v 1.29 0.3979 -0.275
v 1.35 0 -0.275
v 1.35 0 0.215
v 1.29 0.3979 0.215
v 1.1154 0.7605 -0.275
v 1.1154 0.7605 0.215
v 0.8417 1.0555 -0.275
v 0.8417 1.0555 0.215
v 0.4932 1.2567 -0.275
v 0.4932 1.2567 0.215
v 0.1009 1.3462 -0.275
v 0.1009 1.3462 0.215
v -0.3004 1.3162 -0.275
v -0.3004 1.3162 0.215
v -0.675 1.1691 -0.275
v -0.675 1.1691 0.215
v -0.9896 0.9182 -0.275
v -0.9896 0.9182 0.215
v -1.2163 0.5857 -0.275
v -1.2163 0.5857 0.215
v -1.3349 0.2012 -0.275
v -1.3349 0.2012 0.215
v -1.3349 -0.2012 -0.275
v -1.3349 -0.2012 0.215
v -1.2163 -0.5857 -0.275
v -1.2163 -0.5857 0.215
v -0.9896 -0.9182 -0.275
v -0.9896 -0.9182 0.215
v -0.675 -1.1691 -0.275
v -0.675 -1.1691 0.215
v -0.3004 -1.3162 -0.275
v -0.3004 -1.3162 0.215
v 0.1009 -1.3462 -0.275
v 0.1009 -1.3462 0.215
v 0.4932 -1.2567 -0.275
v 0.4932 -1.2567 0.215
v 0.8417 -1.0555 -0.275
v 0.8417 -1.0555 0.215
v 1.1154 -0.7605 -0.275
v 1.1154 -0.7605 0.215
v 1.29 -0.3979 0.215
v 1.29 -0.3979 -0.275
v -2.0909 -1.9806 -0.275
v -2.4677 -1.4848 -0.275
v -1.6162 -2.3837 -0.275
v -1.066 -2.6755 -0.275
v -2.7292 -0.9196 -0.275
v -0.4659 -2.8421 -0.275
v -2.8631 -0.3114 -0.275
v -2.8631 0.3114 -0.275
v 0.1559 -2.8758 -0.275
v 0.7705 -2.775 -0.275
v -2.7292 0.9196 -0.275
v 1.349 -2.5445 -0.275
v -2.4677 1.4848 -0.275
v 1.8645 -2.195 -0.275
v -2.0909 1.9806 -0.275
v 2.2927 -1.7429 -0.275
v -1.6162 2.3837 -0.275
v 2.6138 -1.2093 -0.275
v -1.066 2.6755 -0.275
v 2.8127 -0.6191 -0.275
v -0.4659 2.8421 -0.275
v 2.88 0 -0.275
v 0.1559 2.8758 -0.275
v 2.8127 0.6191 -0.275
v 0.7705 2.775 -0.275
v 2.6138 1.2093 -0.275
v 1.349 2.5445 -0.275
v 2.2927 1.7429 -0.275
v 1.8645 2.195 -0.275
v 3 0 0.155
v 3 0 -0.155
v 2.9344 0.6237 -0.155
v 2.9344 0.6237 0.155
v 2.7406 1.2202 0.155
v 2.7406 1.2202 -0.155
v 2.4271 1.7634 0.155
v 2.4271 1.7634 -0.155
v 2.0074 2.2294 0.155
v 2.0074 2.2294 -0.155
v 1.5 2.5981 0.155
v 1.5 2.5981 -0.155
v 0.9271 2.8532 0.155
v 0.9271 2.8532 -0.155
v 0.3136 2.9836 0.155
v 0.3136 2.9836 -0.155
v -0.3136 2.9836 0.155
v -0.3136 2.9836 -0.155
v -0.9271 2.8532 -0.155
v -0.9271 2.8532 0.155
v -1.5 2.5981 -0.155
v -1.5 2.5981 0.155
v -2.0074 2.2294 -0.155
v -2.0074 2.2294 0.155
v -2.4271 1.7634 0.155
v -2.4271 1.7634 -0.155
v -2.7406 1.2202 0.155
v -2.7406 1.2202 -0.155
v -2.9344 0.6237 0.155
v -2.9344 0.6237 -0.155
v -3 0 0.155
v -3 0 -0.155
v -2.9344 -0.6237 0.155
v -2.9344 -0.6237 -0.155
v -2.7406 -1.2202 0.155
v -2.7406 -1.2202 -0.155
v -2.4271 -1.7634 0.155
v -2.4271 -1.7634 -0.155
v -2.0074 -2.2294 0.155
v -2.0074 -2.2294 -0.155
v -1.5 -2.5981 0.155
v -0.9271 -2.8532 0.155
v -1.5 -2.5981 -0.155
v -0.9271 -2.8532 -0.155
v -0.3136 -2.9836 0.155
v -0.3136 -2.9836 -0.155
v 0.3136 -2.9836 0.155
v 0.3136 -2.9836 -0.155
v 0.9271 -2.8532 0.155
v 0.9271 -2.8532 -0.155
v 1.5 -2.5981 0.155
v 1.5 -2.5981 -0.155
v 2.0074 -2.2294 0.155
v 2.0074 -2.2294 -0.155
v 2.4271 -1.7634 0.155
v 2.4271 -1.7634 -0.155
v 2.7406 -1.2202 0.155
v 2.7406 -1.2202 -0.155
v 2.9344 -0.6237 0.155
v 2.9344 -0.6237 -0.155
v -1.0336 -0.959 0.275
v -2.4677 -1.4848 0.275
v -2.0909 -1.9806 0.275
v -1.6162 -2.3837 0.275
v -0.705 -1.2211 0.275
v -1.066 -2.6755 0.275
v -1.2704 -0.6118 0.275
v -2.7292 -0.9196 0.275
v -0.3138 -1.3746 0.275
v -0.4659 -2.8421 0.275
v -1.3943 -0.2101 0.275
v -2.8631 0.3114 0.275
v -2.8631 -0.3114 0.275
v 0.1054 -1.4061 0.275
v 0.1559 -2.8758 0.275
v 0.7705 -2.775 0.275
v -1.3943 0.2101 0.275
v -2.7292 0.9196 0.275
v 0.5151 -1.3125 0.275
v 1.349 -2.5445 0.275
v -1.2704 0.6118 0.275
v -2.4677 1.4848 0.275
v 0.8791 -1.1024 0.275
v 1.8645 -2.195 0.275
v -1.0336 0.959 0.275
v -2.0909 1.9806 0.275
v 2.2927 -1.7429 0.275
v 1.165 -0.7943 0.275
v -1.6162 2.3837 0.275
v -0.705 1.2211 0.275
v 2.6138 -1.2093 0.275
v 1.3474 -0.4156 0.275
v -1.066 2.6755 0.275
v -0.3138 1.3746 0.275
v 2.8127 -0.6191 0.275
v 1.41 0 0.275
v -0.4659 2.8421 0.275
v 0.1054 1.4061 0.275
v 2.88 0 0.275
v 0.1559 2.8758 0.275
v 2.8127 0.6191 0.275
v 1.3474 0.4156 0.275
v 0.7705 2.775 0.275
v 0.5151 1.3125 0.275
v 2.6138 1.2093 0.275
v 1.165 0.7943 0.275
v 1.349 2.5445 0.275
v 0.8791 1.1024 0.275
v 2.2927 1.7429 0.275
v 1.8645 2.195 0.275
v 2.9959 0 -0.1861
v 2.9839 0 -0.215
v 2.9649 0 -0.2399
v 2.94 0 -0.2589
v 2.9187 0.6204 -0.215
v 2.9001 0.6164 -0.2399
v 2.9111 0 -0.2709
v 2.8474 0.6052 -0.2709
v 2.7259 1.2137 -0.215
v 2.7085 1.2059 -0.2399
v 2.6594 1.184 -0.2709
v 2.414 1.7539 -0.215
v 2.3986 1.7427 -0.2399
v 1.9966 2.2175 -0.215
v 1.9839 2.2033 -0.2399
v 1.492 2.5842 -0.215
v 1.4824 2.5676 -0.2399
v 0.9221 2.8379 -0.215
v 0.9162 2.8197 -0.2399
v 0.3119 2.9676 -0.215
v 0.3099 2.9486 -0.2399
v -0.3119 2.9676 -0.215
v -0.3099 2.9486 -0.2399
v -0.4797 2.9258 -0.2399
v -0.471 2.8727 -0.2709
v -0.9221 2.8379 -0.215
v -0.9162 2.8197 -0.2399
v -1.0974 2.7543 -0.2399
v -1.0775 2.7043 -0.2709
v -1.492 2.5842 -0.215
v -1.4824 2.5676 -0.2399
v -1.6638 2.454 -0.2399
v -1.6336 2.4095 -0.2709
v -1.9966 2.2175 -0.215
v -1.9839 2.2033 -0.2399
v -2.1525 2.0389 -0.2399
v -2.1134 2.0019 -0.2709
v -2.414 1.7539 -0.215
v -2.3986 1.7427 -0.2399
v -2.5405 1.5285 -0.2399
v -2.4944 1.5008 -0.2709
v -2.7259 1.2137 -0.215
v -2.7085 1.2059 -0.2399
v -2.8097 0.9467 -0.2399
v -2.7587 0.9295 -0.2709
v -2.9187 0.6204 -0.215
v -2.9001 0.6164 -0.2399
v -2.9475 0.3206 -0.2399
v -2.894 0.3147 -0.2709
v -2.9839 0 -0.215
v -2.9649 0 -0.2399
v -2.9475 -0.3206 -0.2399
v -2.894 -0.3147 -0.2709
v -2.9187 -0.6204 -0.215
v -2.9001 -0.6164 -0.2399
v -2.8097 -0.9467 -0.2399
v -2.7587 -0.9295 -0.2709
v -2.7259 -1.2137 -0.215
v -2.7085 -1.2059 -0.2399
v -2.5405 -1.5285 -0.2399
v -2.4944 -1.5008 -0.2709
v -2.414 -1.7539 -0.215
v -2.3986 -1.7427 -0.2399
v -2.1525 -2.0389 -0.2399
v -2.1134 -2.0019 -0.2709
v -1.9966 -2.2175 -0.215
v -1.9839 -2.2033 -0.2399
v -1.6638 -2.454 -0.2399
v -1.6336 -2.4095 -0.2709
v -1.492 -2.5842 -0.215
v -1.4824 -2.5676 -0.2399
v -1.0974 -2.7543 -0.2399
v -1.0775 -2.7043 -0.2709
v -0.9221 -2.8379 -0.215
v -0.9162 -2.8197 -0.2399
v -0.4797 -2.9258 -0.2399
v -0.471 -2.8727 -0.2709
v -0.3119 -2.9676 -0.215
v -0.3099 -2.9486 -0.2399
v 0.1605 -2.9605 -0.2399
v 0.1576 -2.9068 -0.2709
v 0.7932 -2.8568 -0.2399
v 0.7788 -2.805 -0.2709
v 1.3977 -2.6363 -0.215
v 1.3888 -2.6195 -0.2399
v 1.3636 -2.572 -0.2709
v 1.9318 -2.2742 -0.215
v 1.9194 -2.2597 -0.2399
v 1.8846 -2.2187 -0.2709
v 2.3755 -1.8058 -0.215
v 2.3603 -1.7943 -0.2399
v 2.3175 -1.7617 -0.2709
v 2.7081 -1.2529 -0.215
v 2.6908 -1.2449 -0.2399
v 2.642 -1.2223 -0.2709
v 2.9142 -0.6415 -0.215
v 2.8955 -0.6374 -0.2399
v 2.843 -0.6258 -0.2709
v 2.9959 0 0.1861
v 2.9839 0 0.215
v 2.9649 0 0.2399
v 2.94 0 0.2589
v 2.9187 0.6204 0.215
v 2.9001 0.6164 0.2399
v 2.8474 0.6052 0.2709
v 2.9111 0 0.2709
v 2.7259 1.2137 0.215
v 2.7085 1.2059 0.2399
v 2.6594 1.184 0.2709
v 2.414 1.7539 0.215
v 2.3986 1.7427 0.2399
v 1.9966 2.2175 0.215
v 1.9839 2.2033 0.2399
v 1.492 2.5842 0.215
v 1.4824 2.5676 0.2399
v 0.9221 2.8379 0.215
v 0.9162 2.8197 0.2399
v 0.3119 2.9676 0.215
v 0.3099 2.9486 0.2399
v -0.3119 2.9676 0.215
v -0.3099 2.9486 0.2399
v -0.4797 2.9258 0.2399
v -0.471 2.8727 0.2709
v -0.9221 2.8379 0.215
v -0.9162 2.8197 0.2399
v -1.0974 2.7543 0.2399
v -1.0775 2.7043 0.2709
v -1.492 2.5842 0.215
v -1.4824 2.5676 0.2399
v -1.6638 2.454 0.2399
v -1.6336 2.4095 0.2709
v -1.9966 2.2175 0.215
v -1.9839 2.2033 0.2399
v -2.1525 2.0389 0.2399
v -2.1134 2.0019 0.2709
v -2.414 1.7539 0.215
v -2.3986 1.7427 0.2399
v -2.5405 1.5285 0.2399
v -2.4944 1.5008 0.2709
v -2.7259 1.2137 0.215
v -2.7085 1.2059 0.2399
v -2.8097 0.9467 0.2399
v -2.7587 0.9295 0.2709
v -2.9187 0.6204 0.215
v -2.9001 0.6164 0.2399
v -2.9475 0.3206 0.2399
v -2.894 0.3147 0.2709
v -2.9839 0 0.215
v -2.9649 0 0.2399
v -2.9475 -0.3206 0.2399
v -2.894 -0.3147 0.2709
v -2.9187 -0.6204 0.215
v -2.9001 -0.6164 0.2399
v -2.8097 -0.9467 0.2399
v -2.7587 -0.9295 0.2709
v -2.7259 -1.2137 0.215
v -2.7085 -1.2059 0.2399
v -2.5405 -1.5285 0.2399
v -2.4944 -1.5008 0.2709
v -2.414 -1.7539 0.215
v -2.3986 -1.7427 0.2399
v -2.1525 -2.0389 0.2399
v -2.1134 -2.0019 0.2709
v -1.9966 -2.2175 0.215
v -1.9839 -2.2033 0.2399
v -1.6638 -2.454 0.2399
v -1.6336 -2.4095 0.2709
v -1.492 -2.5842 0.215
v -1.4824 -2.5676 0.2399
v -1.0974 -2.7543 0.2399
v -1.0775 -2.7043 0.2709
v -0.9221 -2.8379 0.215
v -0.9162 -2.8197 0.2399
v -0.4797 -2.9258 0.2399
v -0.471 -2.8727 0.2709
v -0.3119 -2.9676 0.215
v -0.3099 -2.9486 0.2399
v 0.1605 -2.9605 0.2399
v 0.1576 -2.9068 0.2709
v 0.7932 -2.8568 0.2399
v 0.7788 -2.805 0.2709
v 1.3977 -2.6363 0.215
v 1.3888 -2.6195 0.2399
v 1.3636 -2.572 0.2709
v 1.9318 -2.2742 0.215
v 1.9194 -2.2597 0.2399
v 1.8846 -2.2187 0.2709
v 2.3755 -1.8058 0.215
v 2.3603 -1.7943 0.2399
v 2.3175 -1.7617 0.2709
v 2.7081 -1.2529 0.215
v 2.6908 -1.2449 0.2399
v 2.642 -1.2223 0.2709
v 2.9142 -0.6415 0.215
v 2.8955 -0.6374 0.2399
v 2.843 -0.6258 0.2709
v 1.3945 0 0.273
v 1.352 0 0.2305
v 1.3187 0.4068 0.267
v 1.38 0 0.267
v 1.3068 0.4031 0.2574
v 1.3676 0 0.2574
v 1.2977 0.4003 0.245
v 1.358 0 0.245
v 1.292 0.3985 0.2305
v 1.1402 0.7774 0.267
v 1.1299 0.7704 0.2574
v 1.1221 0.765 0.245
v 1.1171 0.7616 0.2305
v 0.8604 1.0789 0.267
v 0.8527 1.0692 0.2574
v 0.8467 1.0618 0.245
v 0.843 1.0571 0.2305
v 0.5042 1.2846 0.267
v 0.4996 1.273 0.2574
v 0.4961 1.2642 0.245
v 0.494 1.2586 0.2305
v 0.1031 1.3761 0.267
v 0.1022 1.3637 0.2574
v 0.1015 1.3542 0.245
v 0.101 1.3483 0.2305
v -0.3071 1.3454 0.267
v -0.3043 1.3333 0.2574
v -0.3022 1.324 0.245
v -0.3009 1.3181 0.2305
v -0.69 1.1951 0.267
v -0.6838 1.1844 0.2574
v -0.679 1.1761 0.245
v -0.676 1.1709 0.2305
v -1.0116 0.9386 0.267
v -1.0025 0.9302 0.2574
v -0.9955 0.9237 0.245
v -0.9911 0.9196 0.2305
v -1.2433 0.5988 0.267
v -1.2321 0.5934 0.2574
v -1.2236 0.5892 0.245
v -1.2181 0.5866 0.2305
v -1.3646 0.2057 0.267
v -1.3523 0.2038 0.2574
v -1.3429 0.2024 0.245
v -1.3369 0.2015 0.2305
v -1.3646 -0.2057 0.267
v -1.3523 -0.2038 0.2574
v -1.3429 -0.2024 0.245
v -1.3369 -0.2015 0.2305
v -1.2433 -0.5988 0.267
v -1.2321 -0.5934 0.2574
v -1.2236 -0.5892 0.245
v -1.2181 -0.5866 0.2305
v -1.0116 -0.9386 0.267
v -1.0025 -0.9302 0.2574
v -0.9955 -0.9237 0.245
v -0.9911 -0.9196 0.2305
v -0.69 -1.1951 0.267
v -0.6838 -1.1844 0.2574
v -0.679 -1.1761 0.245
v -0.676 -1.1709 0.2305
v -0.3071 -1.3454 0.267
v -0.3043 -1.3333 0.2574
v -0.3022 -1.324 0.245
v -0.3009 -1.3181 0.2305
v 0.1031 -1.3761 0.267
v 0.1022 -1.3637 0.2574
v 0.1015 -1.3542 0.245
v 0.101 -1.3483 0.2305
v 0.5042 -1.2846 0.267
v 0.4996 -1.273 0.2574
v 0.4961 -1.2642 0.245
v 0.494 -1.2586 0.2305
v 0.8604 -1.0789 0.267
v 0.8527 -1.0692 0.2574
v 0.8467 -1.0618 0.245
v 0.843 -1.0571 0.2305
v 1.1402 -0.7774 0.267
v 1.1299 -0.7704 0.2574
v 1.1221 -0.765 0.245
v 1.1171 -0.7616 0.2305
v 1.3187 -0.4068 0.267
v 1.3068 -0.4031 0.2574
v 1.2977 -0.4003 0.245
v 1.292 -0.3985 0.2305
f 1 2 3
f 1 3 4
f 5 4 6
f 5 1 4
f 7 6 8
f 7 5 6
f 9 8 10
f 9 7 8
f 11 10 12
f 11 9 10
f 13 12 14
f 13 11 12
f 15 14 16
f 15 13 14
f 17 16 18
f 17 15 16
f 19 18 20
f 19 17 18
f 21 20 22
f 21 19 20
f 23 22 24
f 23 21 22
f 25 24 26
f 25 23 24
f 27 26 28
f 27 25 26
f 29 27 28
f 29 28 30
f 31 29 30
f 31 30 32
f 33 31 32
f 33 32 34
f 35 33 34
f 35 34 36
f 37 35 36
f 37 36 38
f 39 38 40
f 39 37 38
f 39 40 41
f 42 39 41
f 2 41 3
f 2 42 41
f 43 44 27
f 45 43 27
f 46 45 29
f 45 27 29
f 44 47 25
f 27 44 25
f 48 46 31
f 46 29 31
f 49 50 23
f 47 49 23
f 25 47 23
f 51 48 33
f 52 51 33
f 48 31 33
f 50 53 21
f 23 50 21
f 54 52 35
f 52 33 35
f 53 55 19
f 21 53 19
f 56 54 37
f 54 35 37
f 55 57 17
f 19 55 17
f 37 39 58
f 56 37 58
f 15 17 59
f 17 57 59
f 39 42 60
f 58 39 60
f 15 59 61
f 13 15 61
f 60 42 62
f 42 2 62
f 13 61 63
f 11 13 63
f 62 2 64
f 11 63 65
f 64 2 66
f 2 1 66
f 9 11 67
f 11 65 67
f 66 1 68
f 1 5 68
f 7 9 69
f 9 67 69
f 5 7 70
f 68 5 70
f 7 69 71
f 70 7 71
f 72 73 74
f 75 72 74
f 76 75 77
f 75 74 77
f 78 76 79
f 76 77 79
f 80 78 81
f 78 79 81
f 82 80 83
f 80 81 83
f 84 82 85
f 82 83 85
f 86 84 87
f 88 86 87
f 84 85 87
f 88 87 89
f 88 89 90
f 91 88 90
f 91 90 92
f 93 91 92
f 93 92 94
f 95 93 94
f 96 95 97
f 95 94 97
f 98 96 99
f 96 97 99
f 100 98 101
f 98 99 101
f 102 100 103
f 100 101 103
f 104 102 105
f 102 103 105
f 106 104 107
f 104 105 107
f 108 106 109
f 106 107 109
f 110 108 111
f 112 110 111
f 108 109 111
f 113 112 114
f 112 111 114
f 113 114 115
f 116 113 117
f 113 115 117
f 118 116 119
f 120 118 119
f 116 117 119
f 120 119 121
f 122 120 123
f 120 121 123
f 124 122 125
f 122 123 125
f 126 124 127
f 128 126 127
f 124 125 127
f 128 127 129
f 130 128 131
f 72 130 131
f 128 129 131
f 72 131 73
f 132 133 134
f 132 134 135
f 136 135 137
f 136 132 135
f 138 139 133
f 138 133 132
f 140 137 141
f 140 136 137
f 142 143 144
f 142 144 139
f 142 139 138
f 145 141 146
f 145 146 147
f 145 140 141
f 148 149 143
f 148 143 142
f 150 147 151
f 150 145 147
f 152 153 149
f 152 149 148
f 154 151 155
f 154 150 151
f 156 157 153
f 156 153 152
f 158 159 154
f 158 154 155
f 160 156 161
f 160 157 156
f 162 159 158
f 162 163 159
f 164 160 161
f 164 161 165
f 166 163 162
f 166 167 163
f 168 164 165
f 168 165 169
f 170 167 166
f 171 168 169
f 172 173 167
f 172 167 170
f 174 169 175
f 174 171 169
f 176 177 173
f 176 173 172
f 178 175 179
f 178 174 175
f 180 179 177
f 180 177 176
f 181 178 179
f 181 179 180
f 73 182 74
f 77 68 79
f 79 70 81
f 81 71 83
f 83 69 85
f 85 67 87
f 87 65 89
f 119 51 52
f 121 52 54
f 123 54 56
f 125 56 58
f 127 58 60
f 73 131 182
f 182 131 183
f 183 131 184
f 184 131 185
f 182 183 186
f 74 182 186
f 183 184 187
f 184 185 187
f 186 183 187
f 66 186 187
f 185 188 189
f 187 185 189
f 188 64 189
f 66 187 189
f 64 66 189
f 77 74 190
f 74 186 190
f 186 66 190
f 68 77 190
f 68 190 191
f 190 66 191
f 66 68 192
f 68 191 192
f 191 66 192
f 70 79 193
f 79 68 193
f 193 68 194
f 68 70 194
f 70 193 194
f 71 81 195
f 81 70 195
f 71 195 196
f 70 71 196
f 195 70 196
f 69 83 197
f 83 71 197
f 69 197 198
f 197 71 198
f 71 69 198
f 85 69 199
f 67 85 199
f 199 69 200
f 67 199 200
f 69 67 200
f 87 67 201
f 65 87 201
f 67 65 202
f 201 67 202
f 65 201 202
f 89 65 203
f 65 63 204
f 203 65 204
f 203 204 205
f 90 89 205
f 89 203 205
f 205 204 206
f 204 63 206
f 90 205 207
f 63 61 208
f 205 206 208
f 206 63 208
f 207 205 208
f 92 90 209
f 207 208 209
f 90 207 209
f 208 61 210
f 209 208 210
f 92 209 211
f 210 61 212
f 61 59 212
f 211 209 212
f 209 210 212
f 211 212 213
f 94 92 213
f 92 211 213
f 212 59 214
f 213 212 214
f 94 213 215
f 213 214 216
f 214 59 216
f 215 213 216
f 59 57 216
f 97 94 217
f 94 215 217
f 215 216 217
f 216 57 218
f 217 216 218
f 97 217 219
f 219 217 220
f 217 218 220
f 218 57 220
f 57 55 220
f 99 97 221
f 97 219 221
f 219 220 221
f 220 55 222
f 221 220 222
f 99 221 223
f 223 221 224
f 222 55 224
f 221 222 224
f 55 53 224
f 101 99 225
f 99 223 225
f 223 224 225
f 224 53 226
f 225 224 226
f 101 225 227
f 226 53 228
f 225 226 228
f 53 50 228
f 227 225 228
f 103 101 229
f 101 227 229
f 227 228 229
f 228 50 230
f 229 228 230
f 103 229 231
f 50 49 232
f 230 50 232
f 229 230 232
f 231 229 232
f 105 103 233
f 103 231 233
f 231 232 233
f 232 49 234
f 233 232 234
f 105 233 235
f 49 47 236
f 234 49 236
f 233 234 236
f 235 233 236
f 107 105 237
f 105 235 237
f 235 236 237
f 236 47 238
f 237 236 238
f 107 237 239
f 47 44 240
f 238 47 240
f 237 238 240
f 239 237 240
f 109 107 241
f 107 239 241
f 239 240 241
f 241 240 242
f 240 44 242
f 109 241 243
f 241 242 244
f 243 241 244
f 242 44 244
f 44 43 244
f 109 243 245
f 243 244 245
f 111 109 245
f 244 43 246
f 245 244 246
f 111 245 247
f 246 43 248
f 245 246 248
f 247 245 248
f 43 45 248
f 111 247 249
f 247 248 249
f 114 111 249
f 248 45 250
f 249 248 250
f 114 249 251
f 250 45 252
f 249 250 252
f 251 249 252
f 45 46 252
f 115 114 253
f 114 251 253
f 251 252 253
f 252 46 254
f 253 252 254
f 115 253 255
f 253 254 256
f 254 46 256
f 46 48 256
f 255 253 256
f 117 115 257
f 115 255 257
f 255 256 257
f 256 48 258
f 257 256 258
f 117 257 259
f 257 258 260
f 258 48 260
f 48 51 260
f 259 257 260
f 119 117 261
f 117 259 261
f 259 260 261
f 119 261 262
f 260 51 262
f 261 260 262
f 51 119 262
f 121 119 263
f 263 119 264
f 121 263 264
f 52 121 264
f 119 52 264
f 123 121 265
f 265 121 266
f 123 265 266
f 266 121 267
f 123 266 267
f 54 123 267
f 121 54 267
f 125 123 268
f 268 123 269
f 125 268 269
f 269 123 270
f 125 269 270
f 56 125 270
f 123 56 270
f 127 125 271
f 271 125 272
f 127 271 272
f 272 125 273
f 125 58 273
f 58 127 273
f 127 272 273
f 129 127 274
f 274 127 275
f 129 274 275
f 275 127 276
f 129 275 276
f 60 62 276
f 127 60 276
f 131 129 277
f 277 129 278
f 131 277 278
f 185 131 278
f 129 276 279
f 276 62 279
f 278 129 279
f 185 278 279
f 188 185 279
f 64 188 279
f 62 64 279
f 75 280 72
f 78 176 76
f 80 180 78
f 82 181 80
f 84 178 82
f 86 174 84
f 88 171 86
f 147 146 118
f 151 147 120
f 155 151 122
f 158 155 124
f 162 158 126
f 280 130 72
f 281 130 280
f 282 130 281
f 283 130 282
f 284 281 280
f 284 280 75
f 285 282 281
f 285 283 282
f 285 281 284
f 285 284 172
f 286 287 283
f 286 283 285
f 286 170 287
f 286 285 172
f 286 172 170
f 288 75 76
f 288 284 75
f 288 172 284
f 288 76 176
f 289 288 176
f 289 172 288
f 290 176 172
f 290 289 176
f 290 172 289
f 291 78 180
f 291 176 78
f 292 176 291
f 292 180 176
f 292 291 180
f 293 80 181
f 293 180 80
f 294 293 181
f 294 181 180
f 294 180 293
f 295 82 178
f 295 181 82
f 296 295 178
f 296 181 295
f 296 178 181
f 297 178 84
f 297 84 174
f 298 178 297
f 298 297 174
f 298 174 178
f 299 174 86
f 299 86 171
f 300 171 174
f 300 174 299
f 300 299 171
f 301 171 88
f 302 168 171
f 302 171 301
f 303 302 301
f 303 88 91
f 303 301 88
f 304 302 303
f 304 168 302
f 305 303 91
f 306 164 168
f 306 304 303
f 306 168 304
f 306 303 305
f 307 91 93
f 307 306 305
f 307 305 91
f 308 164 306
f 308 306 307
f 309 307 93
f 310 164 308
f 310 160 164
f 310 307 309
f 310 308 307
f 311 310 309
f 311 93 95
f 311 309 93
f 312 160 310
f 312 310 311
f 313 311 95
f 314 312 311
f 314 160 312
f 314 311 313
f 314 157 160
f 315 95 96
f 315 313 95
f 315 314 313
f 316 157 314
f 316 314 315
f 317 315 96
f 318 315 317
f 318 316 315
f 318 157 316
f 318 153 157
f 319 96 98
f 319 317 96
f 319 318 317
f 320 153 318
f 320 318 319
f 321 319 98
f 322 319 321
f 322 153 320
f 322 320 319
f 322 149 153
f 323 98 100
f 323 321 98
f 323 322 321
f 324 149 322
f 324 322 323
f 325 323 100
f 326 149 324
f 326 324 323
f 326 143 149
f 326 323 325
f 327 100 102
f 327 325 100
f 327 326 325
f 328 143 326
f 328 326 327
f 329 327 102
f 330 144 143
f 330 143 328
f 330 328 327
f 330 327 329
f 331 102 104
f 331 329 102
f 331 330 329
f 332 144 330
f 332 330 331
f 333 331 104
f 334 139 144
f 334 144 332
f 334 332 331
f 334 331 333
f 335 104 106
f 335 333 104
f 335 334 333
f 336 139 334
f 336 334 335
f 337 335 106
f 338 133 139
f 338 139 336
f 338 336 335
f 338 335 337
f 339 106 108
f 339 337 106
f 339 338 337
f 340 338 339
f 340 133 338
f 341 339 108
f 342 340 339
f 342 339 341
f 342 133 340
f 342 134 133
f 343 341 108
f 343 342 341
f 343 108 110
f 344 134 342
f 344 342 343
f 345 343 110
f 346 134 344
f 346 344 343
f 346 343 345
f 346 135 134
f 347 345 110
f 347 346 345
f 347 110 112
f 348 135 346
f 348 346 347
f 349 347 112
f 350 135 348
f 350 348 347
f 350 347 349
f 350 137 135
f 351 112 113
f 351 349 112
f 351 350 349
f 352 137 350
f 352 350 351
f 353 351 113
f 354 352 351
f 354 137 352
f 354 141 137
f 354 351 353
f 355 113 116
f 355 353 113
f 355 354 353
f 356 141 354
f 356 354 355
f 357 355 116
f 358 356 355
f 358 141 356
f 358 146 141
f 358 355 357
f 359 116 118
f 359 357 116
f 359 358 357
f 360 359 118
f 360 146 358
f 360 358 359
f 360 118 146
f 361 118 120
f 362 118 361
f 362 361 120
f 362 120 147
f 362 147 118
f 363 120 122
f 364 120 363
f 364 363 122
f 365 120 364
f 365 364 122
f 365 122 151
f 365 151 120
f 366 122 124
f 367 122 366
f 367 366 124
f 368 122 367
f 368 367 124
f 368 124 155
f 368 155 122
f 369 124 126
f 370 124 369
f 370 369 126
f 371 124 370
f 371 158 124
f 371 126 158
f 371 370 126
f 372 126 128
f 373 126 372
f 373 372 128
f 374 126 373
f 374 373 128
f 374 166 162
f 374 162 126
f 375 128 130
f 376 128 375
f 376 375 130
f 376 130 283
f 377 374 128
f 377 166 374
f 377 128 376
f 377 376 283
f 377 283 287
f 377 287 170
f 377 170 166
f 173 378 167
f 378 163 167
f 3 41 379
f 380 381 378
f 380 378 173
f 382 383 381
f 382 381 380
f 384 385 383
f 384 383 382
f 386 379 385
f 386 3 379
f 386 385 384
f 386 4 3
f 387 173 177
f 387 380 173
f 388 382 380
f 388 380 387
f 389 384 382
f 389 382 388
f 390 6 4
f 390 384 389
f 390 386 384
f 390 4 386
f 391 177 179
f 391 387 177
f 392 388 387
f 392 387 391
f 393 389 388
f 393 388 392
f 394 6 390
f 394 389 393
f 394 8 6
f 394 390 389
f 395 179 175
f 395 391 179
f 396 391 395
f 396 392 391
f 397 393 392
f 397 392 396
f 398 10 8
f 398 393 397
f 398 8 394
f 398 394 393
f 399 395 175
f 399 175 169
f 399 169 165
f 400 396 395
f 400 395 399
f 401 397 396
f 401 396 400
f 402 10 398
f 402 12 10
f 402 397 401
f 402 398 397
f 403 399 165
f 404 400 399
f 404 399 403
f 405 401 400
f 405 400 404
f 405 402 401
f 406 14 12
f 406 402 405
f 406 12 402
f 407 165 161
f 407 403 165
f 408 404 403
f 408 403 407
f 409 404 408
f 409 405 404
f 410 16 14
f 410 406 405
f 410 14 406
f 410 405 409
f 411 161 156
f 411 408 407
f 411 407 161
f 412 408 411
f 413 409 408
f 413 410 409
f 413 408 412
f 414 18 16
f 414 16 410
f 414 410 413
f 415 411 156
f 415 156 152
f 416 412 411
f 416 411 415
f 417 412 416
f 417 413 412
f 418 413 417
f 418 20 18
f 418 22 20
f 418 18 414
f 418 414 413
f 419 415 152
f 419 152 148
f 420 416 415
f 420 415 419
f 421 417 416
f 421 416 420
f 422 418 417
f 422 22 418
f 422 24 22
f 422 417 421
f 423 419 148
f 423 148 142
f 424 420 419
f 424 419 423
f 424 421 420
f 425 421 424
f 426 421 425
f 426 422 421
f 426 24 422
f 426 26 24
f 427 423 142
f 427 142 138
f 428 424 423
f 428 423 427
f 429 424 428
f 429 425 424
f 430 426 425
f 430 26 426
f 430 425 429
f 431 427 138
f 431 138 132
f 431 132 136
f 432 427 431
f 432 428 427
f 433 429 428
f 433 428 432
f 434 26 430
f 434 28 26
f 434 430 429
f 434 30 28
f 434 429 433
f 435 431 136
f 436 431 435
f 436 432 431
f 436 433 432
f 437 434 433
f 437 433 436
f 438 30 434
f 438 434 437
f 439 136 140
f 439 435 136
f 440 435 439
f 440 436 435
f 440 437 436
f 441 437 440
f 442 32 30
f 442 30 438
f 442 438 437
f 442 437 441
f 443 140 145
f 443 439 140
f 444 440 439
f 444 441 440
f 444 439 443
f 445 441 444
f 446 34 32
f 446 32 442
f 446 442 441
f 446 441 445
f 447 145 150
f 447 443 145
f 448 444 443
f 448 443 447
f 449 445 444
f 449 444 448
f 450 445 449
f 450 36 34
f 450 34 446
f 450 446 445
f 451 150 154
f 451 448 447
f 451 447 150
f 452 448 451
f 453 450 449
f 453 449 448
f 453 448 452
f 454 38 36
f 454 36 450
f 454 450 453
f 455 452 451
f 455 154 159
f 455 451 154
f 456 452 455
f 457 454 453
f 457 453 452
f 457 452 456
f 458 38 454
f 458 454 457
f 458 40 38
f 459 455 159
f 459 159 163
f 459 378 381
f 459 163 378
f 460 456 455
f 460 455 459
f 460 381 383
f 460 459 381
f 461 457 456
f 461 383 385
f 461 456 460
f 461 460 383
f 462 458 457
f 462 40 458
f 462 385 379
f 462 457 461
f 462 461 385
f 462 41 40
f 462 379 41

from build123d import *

# Parameters (mm, degrees)
BOSS_EXTRUDE1_DEPTH      = 0.275
BOSS_EXTRUDE1_DEPTH_BACK = 0.275
SKETCH3_R                = 3
SKETCH3_R_2              = 1.35
FILLET1_R                = 0.12
FILLET2_R                = 0.06


with BuildPart() as part:
    # Sketch3 → Boss-Extrude1 (new, two sides: drawn at the far end of the back side and taken through both)
    with BuildSketch(Plane.XY.offset(-BOSS_EXTRUDE1_DEPTH_BACK)):
        Circle(SKETCH3_R)
        Circle(SKETCH3_R_2, mode=Mode.SUBTRACT)
    extrude(amount=BOSS_EXTRUDE1_DEPTH + BOSS_EXTRUDE1_DEPTH_BACK)

    # Fillet1
    fillet1_edges = [part.edges().sort_by_distance(p)[0] for p in [
        (-3, 0, -0.275),
        (-3, 0, 0.275),
    ]]
    fillet(fillet1_edges, radius=FILLET1_R)

    # Fillet2
    fillet2_edges = [part.edges().sort_by_distance(p)[0] for p in [
        (-1.35, 0, 0.275),
    ]]
    fillet(fillet2_edges, radius=FILLET2_R)


solid = part.part
